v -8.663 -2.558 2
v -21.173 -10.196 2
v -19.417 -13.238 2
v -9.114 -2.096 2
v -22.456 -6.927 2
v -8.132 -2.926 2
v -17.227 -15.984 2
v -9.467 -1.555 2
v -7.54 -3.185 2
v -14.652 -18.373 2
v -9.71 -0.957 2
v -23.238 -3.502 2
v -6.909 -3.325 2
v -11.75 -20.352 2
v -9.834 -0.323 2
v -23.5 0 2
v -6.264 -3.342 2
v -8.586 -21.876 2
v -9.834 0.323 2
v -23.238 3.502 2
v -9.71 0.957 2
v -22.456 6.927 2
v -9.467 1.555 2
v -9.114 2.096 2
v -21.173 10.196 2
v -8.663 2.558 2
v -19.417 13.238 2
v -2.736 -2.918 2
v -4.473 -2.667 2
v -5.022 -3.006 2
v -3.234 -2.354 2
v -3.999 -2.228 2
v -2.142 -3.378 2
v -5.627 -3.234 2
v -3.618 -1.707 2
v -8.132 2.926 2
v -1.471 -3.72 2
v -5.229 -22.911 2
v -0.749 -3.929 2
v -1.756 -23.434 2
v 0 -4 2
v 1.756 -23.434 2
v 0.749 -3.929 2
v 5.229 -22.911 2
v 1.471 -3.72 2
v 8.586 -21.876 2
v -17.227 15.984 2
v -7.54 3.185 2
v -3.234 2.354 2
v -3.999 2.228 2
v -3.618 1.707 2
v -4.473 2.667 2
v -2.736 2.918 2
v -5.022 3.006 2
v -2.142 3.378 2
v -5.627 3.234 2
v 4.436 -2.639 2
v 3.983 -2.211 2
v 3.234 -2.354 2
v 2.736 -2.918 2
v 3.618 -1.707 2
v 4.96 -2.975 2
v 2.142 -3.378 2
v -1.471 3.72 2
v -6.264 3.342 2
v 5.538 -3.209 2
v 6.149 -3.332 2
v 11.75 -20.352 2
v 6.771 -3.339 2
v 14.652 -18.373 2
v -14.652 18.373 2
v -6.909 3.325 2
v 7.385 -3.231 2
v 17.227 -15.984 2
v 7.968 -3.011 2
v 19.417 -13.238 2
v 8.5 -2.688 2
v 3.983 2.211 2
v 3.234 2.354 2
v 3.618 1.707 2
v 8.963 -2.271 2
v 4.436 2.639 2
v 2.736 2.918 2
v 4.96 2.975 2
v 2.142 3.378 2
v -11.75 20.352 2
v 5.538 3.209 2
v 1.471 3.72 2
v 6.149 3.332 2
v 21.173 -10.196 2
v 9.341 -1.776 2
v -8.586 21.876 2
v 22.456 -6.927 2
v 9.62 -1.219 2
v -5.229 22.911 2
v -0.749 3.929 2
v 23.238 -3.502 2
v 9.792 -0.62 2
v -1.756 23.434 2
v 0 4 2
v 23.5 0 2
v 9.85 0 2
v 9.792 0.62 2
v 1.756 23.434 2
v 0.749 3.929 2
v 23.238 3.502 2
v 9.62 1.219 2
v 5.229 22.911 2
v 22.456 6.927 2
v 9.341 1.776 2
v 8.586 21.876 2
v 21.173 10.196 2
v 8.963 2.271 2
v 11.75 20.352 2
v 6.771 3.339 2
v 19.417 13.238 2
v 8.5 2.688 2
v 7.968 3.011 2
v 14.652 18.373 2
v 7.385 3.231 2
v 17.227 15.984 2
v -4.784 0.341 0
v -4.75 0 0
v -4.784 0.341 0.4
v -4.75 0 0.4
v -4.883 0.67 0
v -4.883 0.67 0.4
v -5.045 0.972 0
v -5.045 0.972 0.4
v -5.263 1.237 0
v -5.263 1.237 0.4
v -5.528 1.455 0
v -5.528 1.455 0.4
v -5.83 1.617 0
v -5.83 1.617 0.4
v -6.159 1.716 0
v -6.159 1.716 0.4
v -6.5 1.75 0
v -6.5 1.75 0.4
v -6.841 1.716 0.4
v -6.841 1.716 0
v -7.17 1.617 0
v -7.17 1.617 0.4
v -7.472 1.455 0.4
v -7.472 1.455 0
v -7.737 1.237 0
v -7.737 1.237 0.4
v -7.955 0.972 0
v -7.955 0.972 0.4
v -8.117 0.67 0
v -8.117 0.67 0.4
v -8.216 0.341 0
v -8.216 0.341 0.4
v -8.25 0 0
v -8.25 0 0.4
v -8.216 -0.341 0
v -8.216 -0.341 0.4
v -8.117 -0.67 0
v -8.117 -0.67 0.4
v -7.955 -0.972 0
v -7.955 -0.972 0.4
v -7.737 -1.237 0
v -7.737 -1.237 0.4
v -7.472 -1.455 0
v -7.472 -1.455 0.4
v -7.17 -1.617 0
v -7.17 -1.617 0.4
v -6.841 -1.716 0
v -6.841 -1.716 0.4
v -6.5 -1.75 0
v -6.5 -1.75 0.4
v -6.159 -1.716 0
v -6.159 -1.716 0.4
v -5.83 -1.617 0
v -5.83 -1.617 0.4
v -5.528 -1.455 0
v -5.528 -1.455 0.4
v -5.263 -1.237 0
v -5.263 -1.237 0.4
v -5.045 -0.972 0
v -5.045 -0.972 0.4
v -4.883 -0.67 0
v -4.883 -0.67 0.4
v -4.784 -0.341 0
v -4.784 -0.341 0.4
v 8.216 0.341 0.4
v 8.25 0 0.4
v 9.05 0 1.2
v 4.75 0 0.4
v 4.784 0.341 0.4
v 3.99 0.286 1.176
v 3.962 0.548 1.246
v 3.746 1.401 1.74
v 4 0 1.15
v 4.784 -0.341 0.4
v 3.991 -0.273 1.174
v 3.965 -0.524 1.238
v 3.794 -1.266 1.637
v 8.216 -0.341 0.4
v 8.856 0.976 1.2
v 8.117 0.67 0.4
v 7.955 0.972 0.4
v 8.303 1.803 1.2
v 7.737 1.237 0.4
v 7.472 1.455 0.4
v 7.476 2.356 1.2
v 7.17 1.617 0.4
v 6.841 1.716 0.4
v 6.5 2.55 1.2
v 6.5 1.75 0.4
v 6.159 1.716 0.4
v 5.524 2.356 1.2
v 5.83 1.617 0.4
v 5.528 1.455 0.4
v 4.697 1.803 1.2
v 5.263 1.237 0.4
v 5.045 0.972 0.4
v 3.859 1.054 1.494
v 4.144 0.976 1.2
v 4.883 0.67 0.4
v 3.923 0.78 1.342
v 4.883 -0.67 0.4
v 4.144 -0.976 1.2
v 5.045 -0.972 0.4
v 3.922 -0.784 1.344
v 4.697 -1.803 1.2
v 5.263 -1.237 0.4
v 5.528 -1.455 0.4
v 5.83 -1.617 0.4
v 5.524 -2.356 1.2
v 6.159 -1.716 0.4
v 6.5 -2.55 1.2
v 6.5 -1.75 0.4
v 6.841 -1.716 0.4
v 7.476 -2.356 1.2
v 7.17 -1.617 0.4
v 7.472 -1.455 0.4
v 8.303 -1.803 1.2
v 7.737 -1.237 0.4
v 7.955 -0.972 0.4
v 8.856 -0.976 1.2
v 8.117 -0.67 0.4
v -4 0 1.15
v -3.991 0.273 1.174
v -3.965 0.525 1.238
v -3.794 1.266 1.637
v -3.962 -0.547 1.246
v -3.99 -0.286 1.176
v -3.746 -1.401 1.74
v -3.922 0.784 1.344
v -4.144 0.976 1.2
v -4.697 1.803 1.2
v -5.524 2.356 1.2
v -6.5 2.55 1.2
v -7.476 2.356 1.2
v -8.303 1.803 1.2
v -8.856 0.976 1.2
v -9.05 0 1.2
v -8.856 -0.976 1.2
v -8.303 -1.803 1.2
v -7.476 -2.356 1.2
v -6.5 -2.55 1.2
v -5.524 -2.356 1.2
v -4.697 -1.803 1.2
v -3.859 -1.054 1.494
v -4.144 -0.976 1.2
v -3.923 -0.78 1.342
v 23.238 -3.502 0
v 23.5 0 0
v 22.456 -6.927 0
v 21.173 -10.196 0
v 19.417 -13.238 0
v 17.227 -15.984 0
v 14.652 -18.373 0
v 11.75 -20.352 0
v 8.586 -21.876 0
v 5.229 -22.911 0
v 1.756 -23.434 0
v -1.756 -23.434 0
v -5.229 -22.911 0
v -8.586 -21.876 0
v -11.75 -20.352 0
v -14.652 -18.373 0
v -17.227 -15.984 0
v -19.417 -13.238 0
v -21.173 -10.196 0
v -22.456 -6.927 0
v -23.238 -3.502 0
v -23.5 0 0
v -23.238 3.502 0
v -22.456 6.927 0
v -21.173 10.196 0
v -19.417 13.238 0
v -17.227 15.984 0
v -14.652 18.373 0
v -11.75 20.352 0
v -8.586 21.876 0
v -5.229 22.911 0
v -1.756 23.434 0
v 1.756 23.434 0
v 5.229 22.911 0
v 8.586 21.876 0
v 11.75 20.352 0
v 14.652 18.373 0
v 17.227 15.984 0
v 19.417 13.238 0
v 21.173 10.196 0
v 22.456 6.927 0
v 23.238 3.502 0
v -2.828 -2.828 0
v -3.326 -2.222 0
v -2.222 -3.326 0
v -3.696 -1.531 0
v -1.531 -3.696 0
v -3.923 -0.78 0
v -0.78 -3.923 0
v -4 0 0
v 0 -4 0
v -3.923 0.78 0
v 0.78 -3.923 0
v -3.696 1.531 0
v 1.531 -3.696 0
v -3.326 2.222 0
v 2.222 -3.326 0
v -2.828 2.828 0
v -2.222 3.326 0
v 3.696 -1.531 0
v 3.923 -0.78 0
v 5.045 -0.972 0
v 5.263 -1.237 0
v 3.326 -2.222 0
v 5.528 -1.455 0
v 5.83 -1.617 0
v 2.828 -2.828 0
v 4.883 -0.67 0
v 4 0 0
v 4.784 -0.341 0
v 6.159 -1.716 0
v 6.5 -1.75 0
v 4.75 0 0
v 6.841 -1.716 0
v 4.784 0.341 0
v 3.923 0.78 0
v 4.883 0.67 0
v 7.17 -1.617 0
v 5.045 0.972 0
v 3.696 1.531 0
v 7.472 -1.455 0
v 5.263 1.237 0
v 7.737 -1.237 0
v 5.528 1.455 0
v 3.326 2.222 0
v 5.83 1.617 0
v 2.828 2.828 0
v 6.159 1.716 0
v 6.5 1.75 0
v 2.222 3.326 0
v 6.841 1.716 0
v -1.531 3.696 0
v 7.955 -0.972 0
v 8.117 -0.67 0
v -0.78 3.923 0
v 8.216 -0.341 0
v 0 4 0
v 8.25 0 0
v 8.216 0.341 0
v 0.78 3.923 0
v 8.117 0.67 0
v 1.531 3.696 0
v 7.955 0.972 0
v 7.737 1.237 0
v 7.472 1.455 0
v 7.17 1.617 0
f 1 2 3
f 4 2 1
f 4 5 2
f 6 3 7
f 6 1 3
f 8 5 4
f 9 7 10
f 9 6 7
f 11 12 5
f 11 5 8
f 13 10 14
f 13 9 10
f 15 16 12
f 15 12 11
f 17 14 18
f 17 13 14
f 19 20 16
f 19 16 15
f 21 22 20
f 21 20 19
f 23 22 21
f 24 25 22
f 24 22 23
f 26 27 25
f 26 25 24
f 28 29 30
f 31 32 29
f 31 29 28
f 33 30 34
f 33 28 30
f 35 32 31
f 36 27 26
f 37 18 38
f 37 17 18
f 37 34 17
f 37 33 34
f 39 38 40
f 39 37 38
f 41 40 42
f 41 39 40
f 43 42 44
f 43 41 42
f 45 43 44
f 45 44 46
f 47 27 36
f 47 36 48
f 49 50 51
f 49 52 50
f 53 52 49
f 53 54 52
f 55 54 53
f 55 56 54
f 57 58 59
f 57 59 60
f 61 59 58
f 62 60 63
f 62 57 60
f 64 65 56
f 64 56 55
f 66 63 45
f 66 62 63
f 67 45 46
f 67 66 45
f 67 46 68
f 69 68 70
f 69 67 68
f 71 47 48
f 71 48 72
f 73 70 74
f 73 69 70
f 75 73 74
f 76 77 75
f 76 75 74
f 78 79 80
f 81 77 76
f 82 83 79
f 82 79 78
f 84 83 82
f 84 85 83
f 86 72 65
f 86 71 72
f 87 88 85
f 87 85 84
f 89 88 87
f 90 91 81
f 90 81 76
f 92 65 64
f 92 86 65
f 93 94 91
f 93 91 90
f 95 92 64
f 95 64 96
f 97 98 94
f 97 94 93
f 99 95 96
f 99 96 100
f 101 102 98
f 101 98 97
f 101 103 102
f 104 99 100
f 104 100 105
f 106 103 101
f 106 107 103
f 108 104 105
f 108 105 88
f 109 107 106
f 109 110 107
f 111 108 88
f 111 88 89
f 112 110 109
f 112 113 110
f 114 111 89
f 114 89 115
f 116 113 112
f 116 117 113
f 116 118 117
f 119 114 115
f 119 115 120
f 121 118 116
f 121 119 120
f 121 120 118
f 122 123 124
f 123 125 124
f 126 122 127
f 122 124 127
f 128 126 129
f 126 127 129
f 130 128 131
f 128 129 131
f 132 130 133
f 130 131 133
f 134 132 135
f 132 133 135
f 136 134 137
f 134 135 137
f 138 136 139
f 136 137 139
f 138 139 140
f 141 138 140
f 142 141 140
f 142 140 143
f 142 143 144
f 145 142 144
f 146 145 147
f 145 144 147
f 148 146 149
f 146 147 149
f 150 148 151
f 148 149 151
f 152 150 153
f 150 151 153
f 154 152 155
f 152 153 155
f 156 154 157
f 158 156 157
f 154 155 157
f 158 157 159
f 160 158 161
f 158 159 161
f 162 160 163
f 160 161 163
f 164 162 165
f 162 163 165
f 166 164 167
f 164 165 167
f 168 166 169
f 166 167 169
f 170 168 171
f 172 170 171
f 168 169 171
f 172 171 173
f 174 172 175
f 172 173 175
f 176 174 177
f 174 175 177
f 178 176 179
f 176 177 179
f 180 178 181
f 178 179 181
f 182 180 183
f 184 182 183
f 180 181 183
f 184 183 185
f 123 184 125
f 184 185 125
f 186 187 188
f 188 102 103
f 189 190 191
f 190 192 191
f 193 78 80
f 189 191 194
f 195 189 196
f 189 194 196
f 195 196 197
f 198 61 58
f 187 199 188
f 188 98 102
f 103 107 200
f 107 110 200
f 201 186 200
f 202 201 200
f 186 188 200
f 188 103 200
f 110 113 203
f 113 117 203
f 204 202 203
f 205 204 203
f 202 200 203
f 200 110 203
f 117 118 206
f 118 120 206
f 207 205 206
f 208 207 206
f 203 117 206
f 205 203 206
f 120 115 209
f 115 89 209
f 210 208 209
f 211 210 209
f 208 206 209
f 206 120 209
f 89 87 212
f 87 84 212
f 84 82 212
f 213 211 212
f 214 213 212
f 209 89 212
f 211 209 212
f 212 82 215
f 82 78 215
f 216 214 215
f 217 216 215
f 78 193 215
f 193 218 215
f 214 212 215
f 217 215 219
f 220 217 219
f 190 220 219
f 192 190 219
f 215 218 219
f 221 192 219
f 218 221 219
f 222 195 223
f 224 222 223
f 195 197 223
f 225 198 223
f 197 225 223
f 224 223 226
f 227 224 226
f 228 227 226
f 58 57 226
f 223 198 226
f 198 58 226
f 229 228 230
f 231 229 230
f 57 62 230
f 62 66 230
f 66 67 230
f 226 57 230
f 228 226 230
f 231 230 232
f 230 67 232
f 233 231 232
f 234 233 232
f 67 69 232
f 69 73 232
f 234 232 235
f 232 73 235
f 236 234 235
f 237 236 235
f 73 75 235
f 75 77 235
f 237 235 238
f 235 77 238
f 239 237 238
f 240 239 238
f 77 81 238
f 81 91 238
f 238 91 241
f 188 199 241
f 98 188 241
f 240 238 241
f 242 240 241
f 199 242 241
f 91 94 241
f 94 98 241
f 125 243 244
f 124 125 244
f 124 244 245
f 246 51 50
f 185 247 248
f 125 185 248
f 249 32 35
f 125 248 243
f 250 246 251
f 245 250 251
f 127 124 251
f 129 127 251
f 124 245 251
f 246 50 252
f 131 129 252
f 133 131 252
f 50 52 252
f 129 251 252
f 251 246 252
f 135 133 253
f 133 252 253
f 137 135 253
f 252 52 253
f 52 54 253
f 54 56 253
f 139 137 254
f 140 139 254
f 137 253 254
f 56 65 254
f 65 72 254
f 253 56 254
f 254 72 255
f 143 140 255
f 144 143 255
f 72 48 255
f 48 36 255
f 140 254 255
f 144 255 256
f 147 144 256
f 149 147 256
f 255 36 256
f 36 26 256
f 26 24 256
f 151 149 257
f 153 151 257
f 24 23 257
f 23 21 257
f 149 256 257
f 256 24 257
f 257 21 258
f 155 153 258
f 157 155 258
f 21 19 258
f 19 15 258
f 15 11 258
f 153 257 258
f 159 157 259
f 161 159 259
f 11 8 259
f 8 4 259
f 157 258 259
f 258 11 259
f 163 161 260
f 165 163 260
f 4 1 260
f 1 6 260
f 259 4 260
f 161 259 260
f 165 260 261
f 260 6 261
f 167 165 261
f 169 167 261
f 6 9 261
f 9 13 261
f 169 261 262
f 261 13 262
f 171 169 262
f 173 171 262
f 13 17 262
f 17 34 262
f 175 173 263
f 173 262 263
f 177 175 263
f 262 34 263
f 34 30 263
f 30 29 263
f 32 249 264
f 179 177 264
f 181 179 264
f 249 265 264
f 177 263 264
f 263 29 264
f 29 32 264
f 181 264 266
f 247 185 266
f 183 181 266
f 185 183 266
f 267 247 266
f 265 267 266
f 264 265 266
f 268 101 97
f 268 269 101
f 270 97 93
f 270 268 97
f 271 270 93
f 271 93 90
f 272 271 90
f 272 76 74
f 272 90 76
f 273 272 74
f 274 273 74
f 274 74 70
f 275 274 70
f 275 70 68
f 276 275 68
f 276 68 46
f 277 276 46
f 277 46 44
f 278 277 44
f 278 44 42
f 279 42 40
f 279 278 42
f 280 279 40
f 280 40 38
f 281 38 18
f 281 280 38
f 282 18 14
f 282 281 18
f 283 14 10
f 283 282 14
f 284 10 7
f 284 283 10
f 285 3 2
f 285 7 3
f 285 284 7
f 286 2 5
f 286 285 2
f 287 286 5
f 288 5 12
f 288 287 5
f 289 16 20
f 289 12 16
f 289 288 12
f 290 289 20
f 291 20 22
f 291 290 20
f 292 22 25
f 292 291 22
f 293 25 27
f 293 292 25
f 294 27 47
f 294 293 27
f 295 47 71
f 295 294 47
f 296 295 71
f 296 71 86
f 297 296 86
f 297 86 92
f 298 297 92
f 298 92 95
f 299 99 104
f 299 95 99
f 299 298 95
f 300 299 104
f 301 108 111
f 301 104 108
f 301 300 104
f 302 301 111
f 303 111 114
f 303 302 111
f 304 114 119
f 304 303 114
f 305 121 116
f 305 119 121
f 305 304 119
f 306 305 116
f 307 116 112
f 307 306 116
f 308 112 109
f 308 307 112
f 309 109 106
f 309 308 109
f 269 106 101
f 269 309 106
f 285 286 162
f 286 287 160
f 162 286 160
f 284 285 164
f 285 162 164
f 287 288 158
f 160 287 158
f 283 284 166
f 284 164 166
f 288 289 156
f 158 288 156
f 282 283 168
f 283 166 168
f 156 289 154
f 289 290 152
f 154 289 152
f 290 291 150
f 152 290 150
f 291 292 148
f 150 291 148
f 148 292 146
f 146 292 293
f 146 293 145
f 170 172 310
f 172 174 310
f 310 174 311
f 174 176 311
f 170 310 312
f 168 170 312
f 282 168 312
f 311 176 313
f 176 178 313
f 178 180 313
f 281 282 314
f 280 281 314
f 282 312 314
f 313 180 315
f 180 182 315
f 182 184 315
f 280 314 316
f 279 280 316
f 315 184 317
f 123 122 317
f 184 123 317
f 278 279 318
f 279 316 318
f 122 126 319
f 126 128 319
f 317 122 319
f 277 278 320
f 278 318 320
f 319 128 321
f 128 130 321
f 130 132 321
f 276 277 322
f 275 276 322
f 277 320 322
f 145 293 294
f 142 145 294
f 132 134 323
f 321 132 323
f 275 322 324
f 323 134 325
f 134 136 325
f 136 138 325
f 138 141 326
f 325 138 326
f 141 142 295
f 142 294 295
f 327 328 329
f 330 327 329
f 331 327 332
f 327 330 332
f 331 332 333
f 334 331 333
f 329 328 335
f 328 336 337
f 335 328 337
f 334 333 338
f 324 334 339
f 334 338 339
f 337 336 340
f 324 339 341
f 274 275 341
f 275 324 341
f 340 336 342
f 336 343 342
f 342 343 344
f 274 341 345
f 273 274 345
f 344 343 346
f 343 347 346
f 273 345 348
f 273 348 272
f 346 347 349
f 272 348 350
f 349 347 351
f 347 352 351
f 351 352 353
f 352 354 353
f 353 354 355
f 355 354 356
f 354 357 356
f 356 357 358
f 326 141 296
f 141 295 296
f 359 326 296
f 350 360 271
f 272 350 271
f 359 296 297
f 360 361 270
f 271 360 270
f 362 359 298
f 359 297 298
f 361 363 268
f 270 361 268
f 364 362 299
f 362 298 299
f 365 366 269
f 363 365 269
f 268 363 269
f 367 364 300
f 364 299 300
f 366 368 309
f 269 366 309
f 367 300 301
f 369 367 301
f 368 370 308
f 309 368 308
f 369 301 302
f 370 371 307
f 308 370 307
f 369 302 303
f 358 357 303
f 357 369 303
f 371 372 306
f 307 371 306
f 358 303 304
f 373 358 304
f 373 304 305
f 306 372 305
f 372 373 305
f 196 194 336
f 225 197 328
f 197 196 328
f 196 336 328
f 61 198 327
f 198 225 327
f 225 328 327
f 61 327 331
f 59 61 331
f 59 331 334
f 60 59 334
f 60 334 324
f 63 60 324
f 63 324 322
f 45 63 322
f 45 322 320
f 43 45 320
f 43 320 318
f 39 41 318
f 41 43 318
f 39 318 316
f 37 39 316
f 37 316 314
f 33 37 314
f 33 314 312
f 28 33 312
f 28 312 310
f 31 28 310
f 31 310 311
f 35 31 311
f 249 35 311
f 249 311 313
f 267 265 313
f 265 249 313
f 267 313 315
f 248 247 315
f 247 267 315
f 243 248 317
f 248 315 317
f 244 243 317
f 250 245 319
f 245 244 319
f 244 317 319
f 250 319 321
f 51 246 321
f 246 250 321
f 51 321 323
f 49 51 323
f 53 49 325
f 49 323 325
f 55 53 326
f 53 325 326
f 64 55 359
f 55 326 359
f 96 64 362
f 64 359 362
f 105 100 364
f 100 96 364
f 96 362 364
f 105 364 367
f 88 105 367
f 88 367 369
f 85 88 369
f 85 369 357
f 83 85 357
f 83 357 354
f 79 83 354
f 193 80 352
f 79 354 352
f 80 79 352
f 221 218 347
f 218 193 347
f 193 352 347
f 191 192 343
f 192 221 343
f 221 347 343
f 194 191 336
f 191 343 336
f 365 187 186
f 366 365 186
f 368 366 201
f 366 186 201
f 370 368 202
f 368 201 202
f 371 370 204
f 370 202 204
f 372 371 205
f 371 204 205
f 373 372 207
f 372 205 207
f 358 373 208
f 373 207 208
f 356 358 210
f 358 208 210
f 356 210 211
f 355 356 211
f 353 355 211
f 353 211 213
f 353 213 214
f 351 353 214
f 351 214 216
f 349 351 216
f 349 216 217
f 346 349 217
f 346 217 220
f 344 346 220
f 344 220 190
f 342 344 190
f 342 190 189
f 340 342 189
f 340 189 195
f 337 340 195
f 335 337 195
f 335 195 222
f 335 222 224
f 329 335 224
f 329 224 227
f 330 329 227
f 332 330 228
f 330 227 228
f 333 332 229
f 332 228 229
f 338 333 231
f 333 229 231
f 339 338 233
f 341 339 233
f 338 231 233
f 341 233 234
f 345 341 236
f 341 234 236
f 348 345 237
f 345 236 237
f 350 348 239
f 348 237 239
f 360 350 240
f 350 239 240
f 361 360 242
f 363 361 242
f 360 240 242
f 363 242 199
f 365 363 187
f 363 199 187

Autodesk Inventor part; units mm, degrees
ref_plane "YZ Plane" through (0, 0, 0) normal (1, 0, 0) x (0, 1, 0)
ref_plane "XZ Plane" through (0, 0, 0) normal (0, 1, 0) x (-1, 0, 0)
ref_plane "XY Plane" through (0, 0, 0) normal (0, 0, 1) x (1, 0, 0)
sketch "スケッチ1" plane through (0, 0, 0) normal (0, 0, 1) x (1, 0, 0)
  circle A0 centre (0, 0) radius 23.5
  circle A1 centre (0, 0) radius 4
  dimension "d0" = 47
  dimension "d1" = 8
extrude "押し出し1" add sketch "スケッチ1" along normal blind 2
sketch "スケッチ2" plane through (0, 0, 2) normal (0, 0, 1) x (1, 0, 0)
  circle A0 centre (0, 0) radius 6.5 construction
  circle A1 centre (-6.5, 0) radius 1.75
  circle A2 centre (6.5, 0) radius 1.75
  dimension "d4" = 13
  dimension "d5" = 3.5
extrude "押し出し2" cut sketch "スケッチ2" against normal blind 2
chamfer "面取り1" distance 1.6 angle 45 2 edges at (-8.25, 0, 2) (4.75, 0, 2)
properties part number "SlitDiscSupport1"
